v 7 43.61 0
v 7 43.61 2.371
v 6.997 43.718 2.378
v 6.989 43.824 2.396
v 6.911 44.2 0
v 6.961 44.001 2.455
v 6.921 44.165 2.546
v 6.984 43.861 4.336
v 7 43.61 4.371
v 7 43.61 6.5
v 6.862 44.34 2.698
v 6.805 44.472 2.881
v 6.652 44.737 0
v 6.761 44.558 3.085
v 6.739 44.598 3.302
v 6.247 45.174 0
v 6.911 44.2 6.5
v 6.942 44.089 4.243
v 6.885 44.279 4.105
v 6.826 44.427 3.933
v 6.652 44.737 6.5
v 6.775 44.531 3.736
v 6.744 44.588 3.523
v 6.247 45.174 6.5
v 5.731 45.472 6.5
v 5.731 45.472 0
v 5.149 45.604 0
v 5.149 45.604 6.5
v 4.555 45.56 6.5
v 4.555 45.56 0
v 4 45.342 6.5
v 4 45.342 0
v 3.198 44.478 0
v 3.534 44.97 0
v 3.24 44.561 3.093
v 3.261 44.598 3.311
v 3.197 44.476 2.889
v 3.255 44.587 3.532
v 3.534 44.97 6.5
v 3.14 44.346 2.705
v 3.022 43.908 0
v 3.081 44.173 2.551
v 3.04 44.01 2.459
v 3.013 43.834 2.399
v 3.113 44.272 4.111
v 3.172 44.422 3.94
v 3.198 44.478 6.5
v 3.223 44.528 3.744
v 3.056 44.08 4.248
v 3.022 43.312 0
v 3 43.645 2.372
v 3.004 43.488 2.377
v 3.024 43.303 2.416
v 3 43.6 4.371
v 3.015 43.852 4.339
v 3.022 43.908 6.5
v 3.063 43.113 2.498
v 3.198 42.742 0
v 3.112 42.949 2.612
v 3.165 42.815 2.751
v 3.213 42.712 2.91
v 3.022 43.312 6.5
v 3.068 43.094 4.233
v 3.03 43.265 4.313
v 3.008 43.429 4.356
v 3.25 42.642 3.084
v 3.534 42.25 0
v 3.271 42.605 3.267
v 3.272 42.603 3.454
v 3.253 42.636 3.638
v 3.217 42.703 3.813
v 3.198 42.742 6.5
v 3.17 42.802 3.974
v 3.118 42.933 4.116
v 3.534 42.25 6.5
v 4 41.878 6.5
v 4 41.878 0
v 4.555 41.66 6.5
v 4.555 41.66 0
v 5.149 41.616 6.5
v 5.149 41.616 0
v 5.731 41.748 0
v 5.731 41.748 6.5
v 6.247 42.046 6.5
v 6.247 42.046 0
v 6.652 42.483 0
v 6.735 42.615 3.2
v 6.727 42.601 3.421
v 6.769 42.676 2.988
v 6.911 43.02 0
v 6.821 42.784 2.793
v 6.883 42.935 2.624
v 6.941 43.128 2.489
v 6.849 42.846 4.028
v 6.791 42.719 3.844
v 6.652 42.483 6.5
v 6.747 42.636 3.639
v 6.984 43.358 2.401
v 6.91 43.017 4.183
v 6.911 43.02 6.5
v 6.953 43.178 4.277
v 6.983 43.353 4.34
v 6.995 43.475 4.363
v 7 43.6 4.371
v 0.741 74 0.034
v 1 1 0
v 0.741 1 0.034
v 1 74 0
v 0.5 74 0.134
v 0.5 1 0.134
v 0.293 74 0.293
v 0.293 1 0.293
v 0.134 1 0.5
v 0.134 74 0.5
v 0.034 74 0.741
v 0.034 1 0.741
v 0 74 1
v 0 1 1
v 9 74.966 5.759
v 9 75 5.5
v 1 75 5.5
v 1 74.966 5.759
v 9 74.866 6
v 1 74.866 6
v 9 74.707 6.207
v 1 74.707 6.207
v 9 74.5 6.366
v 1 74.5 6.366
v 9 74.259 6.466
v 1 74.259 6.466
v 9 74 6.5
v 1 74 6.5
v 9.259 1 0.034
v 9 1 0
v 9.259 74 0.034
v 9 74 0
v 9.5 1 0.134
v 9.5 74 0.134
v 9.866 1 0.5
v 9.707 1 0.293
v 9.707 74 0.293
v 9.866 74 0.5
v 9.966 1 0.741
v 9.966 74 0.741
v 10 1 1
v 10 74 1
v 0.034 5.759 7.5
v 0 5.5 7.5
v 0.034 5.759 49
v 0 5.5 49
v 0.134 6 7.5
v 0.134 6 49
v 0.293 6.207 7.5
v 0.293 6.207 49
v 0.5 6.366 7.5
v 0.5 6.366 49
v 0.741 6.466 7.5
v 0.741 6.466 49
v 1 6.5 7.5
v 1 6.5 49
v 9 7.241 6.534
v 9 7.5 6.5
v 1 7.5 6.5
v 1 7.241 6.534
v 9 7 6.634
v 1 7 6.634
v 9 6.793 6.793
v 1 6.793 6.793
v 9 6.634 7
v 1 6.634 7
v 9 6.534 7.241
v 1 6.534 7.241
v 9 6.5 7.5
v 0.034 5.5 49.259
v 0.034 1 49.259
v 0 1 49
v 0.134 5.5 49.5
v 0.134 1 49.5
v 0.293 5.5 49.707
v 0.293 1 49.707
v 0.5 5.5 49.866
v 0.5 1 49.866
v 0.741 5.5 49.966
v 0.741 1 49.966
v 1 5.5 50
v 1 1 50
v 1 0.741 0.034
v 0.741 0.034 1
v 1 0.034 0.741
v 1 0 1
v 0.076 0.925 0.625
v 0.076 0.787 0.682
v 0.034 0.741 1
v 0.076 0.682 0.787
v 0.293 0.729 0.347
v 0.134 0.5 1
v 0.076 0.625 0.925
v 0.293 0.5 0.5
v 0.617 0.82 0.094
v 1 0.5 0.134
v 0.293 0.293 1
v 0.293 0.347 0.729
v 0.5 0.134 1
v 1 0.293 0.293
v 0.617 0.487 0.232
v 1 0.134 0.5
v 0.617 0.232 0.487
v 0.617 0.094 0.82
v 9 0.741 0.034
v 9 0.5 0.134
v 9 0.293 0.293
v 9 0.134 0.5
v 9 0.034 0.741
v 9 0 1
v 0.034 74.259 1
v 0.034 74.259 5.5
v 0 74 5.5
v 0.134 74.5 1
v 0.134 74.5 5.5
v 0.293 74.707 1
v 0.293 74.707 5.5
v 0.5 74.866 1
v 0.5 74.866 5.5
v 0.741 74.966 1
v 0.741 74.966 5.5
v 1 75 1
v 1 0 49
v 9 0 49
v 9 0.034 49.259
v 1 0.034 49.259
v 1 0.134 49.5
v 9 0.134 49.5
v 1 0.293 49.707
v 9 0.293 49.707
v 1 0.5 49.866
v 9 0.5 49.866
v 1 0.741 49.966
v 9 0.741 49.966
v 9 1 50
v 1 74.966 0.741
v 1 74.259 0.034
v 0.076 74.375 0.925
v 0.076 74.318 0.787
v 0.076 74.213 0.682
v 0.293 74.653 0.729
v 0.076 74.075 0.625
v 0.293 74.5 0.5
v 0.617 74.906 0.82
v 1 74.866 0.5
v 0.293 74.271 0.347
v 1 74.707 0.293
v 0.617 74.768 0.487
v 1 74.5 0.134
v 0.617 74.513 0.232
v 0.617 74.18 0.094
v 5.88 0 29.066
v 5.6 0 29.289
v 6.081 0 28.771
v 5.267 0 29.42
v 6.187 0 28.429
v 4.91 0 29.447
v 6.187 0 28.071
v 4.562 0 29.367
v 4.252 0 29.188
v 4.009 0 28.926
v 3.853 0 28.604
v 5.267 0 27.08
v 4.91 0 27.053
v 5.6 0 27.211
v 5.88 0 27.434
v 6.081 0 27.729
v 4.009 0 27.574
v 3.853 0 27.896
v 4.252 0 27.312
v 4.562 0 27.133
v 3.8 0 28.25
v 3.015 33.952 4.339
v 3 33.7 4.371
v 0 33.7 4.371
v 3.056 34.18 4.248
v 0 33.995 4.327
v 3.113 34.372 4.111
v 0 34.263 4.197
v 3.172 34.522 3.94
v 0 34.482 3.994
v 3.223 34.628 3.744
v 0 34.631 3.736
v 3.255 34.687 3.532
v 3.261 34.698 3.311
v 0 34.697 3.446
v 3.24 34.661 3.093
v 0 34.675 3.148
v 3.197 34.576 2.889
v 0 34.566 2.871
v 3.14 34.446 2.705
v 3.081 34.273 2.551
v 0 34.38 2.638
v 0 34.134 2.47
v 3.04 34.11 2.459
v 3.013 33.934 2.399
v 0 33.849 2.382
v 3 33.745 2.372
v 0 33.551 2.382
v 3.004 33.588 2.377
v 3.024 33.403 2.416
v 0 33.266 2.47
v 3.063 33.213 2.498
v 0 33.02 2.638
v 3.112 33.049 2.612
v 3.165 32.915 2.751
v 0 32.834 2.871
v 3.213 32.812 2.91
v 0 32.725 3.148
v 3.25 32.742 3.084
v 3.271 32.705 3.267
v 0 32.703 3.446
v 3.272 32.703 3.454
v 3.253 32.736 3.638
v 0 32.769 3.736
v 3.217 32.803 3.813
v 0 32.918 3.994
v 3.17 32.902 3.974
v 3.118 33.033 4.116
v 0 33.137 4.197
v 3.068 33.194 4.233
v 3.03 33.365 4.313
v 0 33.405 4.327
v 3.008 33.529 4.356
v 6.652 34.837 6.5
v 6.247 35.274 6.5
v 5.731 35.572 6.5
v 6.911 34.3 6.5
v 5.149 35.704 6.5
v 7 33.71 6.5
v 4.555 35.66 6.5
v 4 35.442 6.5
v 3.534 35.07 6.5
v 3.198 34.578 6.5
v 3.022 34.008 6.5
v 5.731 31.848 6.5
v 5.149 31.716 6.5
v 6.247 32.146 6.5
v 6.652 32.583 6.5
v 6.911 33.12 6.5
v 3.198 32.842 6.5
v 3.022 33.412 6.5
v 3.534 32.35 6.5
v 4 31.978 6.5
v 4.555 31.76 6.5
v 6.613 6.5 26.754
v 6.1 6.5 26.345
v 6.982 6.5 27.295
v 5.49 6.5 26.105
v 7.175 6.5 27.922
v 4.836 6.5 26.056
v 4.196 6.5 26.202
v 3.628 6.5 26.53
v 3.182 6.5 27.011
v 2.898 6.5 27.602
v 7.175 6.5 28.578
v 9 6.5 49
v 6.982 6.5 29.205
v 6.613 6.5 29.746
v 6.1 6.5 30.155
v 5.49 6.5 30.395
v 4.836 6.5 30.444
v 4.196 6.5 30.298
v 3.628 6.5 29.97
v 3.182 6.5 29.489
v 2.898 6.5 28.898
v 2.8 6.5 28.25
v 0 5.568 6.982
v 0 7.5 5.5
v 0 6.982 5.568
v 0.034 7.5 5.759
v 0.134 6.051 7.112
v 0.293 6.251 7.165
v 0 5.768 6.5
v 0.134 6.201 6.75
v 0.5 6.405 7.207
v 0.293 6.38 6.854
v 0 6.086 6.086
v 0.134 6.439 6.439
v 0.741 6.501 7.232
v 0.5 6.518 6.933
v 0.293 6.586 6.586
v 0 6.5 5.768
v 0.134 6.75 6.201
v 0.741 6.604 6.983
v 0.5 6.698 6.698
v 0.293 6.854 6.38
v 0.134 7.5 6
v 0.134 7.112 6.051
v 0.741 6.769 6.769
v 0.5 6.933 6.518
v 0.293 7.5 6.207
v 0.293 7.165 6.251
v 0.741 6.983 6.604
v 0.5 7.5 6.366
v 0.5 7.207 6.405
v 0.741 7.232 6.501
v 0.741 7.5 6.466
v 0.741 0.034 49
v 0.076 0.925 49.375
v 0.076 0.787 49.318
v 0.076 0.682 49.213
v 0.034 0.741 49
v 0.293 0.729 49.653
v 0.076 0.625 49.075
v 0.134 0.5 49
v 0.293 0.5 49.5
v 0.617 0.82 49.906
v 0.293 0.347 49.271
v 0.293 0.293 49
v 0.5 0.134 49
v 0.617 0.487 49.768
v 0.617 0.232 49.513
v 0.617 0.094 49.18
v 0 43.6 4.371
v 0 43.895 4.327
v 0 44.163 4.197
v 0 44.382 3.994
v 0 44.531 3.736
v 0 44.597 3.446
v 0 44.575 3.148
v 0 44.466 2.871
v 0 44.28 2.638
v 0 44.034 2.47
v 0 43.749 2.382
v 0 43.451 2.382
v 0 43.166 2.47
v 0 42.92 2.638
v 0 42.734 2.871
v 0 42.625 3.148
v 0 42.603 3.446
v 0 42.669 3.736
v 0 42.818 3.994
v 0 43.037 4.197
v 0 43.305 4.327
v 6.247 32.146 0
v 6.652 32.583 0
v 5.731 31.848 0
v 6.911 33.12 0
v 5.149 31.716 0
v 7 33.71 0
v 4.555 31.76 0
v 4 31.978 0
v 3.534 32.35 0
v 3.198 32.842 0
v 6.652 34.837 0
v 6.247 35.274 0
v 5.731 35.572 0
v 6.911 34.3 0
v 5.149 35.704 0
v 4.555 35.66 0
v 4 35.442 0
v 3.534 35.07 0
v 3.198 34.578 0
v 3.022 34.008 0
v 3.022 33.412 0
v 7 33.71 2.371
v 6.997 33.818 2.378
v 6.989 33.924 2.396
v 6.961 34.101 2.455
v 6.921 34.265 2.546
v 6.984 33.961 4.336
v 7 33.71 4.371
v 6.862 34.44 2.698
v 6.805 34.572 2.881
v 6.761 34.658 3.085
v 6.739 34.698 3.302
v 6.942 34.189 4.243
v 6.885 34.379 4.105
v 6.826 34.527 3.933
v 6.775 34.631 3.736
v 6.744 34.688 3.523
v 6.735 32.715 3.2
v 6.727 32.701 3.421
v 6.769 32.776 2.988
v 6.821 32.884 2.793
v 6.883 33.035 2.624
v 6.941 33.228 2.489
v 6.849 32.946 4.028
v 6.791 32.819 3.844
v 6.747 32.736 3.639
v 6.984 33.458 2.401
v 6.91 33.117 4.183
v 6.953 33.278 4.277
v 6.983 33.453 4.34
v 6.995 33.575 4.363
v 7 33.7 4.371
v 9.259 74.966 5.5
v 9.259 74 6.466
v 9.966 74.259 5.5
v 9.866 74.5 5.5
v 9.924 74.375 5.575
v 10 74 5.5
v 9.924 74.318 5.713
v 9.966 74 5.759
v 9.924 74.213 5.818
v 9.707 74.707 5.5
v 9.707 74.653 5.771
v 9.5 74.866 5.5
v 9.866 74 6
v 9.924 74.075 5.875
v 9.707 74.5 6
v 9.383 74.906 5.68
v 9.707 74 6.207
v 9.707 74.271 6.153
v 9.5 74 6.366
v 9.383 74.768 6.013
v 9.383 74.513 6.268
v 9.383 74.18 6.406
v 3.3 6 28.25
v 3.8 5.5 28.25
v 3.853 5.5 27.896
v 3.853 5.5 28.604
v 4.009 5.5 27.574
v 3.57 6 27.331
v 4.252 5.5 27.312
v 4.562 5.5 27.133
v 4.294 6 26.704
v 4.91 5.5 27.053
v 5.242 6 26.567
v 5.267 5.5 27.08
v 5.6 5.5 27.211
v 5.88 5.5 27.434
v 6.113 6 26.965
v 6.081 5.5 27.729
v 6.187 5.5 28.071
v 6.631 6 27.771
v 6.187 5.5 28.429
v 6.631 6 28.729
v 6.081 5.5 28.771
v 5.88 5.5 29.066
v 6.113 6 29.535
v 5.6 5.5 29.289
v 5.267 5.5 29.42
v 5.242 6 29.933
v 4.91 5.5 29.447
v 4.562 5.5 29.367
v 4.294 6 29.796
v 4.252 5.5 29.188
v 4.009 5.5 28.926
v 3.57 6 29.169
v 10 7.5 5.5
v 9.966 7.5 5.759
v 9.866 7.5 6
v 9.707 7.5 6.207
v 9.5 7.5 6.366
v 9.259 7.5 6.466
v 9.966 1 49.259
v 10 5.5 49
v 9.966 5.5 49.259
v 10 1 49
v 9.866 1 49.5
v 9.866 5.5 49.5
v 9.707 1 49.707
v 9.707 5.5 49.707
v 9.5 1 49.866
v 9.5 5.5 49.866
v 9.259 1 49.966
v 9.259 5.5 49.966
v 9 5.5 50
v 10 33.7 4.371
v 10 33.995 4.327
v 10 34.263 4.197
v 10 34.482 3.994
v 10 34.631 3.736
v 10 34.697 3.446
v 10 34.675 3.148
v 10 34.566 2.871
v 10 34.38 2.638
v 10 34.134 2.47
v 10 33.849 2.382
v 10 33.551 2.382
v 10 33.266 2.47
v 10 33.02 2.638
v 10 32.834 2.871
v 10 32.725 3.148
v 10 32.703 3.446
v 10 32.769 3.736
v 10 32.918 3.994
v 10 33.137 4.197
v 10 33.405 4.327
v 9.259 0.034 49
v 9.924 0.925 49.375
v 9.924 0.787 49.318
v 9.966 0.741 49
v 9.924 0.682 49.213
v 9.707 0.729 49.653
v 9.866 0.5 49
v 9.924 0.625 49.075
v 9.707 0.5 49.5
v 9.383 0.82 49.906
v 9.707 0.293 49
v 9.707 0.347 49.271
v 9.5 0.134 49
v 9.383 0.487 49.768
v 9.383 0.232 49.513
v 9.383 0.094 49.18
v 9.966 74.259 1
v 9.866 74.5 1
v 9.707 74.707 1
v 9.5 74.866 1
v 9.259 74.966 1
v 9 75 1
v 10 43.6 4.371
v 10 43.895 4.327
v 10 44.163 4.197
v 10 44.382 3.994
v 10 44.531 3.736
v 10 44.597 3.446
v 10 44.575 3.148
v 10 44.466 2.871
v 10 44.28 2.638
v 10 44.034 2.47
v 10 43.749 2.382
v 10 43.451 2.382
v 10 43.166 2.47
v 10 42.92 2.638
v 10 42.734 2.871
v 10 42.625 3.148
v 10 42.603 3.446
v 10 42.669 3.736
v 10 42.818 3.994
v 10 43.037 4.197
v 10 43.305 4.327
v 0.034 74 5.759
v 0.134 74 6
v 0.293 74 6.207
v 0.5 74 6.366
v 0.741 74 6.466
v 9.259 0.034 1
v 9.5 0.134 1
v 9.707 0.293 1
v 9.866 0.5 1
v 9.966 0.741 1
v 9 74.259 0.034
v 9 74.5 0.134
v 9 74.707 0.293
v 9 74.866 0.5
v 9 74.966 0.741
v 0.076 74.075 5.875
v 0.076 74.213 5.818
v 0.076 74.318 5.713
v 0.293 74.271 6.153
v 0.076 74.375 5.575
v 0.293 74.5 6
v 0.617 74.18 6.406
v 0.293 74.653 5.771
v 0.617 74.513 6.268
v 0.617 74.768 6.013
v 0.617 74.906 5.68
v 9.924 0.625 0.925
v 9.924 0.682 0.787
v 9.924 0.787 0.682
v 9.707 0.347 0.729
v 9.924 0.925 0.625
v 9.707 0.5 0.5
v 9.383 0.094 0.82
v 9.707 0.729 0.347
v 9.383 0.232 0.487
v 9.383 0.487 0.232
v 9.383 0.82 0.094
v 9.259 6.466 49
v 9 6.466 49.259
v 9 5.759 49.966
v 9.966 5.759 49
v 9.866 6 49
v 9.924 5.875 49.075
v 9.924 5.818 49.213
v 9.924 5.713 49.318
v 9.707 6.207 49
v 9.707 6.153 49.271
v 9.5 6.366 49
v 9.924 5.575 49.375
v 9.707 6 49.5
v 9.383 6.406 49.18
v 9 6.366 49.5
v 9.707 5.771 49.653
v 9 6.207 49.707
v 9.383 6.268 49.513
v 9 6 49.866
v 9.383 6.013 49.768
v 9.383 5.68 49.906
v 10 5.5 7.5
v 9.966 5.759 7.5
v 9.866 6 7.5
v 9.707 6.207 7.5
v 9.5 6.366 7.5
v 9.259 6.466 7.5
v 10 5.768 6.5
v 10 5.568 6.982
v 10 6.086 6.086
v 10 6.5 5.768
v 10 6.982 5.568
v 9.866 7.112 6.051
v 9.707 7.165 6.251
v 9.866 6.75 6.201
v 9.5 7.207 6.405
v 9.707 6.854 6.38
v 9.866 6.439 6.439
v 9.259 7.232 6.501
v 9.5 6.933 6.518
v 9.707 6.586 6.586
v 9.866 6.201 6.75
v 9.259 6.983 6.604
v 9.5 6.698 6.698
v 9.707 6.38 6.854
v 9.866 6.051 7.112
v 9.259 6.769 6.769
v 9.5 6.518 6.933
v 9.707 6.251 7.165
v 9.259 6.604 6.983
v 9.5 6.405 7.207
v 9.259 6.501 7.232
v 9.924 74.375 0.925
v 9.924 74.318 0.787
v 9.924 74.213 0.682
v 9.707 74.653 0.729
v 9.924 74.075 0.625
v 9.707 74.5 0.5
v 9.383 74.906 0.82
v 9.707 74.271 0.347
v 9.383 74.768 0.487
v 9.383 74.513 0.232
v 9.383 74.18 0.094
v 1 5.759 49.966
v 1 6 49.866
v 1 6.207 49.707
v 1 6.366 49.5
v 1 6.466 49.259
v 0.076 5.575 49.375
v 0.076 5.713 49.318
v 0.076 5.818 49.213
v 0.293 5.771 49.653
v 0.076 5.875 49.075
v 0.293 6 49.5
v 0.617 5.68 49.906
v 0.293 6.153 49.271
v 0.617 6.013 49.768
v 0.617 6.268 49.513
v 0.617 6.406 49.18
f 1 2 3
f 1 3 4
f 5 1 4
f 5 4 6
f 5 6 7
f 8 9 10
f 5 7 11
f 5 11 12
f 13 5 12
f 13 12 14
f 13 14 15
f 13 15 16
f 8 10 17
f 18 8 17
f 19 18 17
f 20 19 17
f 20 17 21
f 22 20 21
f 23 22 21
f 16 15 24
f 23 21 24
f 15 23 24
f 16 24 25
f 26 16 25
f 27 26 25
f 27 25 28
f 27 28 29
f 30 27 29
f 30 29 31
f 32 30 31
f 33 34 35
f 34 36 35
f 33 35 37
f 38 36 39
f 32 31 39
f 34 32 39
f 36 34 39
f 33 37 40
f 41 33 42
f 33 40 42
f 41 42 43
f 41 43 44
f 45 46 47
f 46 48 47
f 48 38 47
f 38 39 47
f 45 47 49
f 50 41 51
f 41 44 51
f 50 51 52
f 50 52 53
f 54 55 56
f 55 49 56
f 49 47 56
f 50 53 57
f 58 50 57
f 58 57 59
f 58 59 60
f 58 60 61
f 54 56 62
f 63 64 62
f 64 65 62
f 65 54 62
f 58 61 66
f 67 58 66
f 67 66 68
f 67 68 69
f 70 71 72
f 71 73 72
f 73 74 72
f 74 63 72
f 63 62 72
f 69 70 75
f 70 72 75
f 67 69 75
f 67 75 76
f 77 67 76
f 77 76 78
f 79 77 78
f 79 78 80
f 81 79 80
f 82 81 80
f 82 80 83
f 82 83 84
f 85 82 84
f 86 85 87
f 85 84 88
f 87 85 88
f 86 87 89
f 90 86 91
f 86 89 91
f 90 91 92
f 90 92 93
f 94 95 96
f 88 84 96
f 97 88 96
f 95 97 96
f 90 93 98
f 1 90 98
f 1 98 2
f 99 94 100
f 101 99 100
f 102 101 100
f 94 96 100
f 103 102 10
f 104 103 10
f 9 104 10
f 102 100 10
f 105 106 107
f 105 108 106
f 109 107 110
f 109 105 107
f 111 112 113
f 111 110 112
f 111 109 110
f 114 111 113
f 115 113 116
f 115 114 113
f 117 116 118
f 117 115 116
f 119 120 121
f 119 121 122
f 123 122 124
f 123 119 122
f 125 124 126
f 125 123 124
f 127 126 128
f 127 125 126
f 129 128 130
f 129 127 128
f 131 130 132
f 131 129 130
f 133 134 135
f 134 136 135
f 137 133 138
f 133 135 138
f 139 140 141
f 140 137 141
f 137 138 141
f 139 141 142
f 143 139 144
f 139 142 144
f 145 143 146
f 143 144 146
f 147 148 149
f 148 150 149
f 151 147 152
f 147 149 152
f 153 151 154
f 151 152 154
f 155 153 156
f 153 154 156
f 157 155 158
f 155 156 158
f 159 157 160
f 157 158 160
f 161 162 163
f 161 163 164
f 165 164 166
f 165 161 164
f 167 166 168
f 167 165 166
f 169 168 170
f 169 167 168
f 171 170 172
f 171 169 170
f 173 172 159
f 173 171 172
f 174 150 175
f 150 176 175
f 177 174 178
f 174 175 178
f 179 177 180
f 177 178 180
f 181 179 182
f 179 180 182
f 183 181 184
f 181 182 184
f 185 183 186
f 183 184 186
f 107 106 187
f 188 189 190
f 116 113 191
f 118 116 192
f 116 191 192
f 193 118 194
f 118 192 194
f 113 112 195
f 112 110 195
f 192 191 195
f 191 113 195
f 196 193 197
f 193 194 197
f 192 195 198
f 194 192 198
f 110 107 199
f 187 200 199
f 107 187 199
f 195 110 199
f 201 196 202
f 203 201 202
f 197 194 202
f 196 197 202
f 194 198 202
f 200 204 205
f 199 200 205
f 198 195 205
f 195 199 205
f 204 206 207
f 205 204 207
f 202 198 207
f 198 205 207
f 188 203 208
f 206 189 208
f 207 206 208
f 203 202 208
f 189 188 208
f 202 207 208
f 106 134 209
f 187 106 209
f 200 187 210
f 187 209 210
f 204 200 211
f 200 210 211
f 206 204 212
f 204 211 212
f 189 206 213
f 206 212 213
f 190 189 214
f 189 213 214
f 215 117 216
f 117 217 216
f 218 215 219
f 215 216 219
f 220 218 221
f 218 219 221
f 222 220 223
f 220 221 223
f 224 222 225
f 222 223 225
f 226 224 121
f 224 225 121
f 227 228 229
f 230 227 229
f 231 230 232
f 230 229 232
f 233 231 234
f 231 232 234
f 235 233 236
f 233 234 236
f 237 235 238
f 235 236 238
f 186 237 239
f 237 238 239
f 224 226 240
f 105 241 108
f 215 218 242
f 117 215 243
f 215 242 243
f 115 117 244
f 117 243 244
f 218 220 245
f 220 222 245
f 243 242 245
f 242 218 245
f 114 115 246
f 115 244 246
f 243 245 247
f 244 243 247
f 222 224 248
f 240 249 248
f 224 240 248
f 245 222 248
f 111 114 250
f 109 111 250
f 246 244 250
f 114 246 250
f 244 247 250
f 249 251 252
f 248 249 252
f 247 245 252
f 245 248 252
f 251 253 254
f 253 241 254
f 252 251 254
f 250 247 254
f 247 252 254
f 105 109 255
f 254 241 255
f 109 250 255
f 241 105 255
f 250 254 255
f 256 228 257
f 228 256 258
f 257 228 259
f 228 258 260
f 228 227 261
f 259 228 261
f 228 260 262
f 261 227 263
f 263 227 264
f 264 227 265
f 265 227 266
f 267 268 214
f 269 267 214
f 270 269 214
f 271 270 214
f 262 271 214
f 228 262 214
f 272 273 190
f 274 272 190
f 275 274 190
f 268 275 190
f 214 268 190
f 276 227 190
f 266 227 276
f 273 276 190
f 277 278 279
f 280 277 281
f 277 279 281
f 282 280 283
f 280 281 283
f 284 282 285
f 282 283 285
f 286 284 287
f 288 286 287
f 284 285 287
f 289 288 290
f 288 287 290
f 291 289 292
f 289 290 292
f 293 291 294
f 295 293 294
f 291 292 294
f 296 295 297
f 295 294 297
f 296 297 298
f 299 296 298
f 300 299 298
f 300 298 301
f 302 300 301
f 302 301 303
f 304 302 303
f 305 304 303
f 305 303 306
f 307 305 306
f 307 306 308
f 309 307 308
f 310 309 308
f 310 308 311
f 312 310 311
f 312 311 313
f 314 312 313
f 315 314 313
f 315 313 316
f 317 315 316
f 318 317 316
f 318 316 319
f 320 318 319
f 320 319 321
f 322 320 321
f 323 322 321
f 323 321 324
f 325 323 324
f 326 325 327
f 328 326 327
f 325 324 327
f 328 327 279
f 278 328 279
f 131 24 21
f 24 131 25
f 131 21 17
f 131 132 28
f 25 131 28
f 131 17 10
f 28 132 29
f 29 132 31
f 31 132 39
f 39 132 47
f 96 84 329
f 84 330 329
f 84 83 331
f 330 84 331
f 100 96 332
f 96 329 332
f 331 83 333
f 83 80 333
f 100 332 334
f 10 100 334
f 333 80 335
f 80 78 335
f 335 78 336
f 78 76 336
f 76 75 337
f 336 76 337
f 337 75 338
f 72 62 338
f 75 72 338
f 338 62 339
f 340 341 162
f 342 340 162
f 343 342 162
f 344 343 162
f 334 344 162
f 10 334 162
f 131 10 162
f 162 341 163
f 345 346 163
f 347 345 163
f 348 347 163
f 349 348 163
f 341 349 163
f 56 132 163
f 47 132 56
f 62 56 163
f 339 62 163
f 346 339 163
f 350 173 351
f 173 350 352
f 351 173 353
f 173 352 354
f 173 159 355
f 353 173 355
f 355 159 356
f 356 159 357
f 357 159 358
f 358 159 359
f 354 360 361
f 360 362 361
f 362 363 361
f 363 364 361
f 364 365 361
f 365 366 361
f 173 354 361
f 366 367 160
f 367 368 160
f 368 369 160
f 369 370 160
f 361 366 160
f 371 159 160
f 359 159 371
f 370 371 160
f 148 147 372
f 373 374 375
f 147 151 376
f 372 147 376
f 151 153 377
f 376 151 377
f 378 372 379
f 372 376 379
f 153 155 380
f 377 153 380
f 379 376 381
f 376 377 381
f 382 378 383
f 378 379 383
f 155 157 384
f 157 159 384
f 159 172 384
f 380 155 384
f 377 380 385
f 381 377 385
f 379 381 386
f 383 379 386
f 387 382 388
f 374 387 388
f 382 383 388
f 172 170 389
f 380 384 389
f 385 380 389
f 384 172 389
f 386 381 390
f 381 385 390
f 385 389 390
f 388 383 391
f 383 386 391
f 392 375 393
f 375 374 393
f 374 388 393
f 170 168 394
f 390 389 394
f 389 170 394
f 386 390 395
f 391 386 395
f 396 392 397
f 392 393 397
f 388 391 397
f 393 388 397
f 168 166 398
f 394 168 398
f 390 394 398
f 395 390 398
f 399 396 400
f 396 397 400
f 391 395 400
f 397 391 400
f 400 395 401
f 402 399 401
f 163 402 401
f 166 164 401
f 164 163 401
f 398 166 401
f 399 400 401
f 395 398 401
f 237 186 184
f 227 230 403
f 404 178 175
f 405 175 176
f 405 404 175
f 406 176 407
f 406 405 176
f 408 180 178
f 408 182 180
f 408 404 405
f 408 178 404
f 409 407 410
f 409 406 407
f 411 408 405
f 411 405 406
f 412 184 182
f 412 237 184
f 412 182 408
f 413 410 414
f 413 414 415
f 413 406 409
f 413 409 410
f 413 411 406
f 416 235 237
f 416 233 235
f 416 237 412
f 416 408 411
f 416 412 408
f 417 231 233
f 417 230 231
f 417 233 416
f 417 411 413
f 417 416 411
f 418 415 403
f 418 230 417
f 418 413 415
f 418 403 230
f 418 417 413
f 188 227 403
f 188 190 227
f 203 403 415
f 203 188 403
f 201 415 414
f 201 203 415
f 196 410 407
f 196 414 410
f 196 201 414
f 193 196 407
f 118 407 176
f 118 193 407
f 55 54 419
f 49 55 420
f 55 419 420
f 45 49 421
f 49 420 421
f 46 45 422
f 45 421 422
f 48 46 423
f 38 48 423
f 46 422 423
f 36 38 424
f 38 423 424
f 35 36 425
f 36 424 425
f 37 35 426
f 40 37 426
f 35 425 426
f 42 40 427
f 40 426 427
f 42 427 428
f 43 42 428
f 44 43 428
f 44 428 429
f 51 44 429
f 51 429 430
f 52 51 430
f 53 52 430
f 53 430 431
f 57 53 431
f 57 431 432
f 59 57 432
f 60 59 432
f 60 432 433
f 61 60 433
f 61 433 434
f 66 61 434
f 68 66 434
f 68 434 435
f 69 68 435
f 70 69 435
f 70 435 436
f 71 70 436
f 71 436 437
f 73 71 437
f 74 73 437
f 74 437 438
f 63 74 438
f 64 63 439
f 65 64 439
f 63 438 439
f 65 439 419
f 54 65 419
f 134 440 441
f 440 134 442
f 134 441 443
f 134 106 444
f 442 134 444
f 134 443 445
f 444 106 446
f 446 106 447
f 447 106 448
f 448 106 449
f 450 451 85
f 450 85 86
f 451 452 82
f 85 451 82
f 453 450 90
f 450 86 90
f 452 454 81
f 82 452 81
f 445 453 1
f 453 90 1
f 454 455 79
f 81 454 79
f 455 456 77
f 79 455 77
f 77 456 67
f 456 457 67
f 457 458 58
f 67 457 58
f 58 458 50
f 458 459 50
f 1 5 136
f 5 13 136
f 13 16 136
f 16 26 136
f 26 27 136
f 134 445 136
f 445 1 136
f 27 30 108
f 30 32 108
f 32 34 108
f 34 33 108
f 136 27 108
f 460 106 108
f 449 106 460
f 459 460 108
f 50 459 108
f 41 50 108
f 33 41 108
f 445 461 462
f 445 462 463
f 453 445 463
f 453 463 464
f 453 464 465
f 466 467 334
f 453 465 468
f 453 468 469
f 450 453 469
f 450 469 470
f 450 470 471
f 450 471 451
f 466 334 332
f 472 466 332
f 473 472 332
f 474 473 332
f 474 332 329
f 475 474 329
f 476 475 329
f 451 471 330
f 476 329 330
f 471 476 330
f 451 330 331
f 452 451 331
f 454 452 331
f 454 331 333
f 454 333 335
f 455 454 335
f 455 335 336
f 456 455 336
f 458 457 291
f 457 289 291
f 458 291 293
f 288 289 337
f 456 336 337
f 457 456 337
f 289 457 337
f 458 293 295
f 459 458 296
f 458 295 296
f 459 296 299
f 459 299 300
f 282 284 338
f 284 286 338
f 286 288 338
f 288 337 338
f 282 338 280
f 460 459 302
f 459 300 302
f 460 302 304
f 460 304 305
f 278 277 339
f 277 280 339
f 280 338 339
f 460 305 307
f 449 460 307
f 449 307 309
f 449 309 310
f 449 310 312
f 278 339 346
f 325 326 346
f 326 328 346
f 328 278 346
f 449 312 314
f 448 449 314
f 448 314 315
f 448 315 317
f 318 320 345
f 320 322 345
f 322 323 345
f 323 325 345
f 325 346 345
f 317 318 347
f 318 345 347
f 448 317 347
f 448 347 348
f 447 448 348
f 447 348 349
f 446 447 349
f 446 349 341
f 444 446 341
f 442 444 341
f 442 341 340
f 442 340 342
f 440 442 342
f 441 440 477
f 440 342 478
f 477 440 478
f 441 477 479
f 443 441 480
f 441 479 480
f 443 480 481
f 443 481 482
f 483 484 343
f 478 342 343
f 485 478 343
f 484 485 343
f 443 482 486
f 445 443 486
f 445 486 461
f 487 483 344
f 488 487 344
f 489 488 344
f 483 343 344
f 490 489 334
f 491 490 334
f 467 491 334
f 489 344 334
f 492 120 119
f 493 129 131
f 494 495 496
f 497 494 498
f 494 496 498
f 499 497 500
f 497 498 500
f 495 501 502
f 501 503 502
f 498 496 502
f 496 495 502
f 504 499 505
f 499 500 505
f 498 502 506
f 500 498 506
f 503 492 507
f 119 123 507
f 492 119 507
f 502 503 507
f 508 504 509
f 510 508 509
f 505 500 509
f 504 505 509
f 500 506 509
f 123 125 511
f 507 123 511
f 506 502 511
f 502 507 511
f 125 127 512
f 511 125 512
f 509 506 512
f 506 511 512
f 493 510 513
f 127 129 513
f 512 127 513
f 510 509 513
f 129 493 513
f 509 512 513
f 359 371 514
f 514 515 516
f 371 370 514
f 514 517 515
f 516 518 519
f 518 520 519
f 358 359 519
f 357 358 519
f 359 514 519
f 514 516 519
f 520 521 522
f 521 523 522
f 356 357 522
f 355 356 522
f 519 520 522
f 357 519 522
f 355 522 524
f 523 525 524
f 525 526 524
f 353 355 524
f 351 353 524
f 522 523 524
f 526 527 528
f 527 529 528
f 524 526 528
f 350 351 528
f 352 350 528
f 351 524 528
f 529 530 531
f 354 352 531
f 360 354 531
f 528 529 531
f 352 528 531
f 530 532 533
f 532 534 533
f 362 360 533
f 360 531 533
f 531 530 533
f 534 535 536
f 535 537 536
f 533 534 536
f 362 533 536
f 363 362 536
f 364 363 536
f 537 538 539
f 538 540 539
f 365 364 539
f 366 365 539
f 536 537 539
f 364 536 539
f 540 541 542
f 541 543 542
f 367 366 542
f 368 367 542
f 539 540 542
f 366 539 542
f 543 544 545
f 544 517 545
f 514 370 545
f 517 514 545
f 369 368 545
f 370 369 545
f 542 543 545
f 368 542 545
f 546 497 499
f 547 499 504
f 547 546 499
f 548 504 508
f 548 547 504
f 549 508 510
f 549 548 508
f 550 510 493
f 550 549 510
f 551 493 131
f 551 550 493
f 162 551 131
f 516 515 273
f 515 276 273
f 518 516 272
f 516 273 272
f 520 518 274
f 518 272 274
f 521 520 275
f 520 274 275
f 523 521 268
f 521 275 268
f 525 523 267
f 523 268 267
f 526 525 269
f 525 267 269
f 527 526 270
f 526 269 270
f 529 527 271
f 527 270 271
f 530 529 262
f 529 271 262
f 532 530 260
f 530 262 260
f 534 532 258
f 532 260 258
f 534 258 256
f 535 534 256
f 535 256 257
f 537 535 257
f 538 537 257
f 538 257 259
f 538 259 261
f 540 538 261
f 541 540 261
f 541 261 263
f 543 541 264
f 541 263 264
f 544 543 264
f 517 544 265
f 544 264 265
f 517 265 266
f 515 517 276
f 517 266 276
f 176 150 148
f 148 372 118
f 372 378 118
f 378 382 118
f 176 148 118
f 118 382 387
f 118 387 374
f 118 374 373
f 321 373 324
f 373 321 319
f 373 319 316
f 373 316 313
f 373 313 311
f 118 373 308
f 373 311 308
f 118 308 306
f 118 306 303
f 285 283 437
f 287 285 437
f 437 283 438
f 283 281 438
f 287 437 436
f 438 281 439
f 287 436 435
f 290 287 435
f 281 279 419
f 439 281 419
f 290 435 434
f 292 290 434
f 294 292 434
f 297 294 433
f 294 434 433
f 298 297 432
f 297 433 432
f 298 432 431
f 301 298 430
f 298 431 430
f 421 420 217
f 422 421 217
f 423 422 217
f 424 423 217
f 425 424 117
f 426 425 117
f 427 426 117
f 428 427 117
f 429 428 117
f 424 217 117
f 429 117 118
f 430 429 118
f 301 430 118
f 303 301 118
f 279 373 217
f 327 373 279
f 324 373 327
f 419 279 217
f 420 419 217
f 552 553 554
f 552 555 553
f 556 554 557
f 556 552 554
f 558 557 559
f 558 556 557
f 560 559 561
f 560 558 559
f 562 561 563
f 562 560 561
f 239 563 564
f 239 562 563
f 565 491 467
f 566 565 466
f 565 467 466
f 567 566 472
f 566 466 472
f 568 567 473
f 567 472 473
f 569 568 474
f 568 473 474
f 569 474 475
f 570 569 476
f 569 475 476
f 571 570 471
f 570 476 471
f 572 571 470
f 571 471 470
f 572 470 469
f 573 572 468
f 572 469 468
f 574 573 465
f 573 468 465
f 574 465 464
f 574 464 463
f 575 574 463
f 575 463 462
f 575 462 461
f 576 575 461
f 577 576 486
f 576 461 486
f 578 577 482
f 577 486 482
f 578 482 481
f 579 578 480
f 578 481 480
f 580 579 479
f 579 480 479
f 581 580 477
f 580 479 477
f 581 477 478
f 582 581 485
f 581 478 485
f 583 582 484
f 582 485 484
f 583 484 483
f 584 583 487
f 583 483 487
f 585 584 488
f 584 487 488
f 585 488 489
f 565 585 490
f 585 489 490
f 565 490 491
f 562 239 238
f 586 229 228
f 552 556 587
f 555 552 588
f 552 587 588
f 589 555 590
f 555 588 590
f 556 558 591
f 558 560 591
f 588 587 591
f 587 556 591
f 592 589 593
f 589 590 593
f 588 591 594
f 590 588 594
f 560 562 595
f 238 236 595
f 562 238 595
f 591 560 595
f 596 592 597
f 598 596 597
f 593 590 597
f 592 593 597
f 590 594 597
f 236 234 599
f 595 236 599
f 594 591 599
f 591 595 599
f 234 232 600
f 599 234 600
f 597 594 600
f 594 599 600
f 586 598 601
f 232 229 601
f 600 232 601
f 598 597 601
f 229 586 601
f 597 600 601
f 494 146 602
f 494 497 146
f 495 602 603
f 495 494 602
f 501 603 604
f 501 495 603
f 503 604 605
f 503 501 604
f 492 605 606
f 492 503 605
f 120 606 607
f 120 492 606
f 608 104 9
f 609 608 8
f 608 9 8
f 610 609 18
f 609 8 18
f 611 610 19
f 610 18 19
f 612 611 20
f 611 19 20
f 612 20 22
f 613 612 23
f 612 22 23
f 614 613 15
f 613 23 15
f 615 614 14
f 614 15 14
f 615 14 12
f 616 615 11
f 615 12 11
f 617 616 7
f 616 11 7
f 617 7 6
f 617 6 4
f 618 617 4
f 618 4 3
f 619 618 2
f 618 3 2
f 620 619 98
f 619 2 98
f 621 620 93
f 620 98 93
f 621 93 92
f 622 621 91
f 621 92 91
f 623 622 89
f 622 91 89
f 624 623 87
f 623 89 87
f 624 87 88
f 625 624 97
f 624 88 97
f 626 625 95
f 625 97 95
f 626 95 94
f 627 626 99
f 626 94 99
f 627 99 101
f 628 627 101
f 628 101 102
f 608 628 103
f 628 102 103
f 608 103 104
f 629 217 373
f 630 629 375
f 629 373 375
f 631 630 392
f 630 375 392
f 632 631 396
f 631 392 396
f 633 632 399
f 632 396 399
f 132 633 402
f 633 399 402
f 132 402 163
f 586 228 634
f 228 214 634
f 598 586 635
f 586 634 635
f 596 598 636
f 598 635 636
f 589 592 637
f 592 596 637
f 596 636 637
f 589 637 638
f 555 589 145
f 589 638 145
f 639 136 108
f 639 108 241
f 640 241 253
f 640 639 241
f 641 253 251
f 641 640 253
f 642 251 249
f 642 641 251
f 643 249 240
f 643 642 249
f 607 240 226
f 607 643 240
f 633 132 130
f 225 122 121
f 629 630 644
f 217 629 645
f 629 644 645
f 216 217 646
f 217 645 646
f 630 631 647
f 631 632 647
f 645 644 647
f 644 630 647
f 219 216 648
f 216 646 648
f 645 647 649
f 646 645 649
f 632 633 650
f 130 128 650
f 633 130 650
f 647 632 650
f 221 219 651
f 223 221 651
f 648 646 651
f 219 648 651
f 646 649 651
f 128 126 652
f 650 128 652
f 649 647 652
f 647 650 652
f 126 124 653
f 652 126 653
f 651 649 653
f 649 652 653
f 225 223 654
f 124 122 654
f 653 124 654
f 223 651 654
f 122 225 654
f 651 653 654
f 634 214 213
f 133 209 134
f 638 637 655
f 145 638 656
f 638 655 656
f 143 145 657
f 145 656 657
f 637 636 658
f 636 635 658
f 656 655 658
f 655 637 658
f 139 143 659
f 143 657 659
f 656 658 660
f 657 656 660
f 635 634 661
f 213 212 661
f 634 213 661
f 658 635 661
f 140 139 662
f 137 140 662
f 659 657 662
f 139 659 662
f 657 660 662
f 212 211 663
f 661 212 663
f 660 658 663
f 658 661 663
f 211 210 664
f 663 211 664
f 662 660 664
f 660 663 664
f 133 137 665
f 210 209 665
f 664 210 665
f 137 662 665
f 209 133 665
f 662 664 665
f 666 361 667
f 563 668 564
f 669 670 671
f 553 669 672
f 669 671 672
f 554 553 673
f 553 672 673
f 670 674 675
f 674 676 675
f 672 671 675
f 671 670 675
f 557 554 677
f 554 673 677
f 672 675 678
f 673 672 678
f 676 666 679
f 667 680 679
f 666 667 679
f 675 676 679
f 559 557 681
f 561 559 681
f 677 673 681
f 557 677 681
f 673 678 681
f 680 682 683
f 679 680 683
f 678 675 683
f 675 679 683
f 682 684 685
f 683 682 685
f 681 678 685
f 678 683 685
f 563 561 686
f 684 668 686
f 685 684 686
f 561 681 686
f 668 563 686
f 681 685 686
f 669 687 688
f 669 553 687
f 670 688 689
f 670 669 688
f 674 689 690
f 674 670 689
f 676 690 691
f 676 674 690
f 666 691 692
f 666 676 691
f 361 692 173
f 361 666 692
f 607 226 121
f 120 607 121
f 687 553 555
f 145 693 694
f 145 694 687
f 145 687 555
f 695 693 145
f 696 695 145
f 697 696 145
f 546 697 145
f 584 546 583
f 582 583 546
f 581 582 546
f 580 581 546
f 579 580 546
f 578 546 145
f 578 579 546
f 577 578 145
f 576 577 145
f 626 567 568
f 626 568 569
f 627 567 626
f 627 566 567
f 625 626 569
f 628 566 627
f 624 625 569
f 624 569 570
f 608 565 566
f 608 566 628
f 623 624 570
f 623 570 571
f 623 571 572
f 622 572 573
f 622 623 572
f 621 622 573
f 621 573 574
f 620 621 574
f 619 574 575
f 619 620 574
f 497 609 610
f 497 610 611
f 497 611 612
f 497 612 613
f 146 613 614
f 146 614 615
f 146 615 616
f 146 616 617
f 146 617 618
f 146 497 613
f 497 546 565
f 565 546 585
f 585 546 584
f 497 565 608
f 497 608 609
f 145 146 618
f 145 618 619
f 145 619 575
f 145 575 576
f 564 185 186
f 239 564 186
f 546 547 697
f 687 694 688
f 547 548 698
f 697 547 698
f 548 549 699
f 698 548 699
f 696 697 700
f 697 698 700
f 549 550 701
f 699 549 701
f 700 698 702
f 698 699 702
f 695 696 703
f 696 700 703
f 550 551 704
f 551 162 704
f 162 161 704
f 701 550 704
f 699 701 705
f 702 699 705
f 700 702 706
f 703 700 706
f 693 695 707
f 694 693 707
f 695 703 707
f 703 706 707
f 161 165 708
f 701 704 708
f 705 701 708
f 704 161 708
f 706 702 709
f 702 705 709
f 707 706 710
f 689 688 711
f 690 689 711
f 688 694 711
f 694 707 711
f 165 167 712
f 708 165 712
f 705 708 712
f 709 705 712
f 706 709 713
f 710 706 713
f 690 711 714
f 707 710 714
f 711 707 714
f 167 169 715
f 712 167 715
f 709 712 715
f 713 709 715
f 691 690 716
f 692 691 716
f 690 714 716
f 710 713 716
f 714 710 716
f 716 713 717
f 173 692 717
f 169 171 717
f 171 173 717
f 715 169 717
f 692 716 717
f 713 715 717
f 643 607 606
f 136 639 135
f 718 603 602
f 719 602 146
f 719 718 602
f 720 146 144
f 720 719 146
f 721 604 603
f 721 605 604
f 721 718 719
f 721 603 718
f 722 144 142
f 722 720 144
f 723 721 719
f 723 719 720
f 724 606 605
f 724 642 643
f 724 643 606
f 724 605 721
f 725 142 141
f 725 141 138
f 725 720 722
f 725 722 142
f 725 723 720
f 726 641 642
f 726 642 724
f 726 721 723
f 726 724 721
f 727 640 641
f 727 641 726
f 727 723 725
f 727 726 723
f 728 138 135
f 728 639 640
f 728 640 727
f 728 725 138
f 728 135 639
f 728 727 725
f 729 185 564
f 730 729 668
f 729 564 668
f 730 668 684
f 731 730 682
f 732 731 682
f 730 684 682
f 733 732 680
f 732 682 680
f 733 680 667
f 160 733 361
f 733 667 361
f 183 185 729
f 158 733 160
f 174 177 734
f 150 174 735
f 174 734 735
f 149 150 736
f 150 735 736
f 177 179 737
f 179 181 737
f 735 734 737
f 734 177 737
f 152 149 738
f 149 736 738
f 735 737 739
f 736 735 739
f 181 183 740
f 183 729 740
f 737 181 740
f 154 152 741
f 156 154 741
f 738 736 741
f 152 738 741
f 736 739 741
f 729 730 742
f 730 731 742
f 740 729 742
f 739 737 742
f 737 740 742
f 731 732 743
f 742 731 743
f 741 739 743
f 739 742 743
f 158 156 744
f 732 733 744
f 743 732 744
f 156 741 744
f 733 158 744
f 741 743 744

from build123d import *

# Parameters (mm, degrees)
BOSS_EXTRUDE1_DEPTH                                 = 10
CSK_FOR_M2_COUNTERSUNK_FLAT_HEAD_SCREW1_D           = 2.4
CSK_FOR_M2_COUNTERSUNK_FLAT_HEAD_SCREW1_DEPTH       = 30
CSK_FOR_M2_COUNTERSUNK_FLAT_HEAD_SCREW1_CSINK_D     = 4.4
CSK_FOR_M2_COUNTERSUNK_FLAT_HEAD_SCREW1_CSINK_ANGLE = 90
CSK_FOR_M2_COUNTERSUNK_FLAT_HEAD_SCREW1_TIP         = 0.721032743
SKETCH4_R                                           = 1
CUT_EXTRUDE1_DEPTH                                  = 91.691785736
SKETCH5_R                                           = 2
CUT_EXTRUDE2_DEPTH                                  = 88.27685833
FILLET1_R                                           = 1


with BuildPart() as part:
    # Sketch1 → Boss-Extrude1 (new body)
    with BuildSketch(Plane(origin=(0, 0, 0), x_dir=(0, 0, -1), z_dir=(1, 0, 0))):
        Polygon((0, 0), (0, 75), (-6.5, 75), (-6.5, 6.5), (-50, 6.5), (-50, 0), align=None)
    extrude(amount=BOSS_EXTRUDE1_DEPTH)

    # CSK for M2 Countersunk Flat Head Screw1
    with Locations(Plane(origin=(0, 6.5, 0), x_dir=(1, 0, 0), z_dir=(0, 1, 0))):
        with Locations((5, -28.25)):
            CounterSinkHole(CSK_FOR_M2_COUNTERSUNK_FLAT_HEAD_SCREW1_D / 2, CSK_FOR_M2_COUNTERSUNK_FLAT_HEAD_SCREW1_CSINK_D / 2, depth=CSK_FOR_M2_COUNTERSUNK_FLAT_HEAD_SCREW1_DEPTH, counter_sink_angle=CSK_FOR_M2_COUNTERSUNK_FLAT_HEAD_SCREW1_CSINK_ANGLE)
            with Locations((0, 0, -(CSK_FOR_M2_COUNTERSUNK_FLAT_HEAD_SCREW1_DEPTH + CSK_FOR_M2_COUNTERSUNK_FLAT_HEAD_SCREW1_TIP / 2))):  # 118° drill point
                Cone(0, CSK_FOR_M2_COUNTERSUNK_FLAT_HEAD_SCREW1_D / 2, CSK_FOR_M2_COUNTERSUNK_FLAT_HEAD_SCREW1_TIP, mode=Mode.SUBTRACT)

    # Sketch4 → Cut-Extrude1 (cut, through all)
    with BuildSketch(Plane.ZY):
        with Locations((3.370981866, 33.7)):
            Circle(SKETCH4_R)
        with Locations((3.370981866, 43.6)):
            Circle(SKETCH4_R)
    extrude(amount=-CUT_EXTRUDE1_DEPTH, mode=Mode.SUBTRACT)

    # Sketch5 → Cut-Extrude2 (cut, through all)
    with BuildSketch(Plane.XY.offset(6.5)):
        with Locations((5, 43.61)):
            Circle(SKETCH5_R)
        with Locations((5, 33.71)):
            Circle(SKETCH5_R)
    extrude(amount=-CUT_EXTRUDE2_DEPTH, mode=Mode.SUBTRACT)

    # Fillet1
    fillet1_edges = [part.edges().sort_by_distance(p)[0] for p in [
        (5, 0, 50),
        (5, 6.5, 50),
        (5, 6.5, 6.5),
        (5, 75, 6.5),
        (5, 75, 0),
        (5, 0, 0),
        (10, 75, 3.25),
        (10, 40.75, 6.5),
        (10, 6.5, 28.25),
        (10, 3.25, 50),
        (10, 0, 25),
        (0, 3.25, 50),
        (0, 6.5, 28.25),
        (0, 40.75, 6.5),
        (0, 75, 3.25),
        (0, 37.5, 0),
        (0, 0, 25),
        (10, 37.5, 0),
    ]]
    fillet(fillet1_edges, radius=FILLET1_R)


solid = part.part
